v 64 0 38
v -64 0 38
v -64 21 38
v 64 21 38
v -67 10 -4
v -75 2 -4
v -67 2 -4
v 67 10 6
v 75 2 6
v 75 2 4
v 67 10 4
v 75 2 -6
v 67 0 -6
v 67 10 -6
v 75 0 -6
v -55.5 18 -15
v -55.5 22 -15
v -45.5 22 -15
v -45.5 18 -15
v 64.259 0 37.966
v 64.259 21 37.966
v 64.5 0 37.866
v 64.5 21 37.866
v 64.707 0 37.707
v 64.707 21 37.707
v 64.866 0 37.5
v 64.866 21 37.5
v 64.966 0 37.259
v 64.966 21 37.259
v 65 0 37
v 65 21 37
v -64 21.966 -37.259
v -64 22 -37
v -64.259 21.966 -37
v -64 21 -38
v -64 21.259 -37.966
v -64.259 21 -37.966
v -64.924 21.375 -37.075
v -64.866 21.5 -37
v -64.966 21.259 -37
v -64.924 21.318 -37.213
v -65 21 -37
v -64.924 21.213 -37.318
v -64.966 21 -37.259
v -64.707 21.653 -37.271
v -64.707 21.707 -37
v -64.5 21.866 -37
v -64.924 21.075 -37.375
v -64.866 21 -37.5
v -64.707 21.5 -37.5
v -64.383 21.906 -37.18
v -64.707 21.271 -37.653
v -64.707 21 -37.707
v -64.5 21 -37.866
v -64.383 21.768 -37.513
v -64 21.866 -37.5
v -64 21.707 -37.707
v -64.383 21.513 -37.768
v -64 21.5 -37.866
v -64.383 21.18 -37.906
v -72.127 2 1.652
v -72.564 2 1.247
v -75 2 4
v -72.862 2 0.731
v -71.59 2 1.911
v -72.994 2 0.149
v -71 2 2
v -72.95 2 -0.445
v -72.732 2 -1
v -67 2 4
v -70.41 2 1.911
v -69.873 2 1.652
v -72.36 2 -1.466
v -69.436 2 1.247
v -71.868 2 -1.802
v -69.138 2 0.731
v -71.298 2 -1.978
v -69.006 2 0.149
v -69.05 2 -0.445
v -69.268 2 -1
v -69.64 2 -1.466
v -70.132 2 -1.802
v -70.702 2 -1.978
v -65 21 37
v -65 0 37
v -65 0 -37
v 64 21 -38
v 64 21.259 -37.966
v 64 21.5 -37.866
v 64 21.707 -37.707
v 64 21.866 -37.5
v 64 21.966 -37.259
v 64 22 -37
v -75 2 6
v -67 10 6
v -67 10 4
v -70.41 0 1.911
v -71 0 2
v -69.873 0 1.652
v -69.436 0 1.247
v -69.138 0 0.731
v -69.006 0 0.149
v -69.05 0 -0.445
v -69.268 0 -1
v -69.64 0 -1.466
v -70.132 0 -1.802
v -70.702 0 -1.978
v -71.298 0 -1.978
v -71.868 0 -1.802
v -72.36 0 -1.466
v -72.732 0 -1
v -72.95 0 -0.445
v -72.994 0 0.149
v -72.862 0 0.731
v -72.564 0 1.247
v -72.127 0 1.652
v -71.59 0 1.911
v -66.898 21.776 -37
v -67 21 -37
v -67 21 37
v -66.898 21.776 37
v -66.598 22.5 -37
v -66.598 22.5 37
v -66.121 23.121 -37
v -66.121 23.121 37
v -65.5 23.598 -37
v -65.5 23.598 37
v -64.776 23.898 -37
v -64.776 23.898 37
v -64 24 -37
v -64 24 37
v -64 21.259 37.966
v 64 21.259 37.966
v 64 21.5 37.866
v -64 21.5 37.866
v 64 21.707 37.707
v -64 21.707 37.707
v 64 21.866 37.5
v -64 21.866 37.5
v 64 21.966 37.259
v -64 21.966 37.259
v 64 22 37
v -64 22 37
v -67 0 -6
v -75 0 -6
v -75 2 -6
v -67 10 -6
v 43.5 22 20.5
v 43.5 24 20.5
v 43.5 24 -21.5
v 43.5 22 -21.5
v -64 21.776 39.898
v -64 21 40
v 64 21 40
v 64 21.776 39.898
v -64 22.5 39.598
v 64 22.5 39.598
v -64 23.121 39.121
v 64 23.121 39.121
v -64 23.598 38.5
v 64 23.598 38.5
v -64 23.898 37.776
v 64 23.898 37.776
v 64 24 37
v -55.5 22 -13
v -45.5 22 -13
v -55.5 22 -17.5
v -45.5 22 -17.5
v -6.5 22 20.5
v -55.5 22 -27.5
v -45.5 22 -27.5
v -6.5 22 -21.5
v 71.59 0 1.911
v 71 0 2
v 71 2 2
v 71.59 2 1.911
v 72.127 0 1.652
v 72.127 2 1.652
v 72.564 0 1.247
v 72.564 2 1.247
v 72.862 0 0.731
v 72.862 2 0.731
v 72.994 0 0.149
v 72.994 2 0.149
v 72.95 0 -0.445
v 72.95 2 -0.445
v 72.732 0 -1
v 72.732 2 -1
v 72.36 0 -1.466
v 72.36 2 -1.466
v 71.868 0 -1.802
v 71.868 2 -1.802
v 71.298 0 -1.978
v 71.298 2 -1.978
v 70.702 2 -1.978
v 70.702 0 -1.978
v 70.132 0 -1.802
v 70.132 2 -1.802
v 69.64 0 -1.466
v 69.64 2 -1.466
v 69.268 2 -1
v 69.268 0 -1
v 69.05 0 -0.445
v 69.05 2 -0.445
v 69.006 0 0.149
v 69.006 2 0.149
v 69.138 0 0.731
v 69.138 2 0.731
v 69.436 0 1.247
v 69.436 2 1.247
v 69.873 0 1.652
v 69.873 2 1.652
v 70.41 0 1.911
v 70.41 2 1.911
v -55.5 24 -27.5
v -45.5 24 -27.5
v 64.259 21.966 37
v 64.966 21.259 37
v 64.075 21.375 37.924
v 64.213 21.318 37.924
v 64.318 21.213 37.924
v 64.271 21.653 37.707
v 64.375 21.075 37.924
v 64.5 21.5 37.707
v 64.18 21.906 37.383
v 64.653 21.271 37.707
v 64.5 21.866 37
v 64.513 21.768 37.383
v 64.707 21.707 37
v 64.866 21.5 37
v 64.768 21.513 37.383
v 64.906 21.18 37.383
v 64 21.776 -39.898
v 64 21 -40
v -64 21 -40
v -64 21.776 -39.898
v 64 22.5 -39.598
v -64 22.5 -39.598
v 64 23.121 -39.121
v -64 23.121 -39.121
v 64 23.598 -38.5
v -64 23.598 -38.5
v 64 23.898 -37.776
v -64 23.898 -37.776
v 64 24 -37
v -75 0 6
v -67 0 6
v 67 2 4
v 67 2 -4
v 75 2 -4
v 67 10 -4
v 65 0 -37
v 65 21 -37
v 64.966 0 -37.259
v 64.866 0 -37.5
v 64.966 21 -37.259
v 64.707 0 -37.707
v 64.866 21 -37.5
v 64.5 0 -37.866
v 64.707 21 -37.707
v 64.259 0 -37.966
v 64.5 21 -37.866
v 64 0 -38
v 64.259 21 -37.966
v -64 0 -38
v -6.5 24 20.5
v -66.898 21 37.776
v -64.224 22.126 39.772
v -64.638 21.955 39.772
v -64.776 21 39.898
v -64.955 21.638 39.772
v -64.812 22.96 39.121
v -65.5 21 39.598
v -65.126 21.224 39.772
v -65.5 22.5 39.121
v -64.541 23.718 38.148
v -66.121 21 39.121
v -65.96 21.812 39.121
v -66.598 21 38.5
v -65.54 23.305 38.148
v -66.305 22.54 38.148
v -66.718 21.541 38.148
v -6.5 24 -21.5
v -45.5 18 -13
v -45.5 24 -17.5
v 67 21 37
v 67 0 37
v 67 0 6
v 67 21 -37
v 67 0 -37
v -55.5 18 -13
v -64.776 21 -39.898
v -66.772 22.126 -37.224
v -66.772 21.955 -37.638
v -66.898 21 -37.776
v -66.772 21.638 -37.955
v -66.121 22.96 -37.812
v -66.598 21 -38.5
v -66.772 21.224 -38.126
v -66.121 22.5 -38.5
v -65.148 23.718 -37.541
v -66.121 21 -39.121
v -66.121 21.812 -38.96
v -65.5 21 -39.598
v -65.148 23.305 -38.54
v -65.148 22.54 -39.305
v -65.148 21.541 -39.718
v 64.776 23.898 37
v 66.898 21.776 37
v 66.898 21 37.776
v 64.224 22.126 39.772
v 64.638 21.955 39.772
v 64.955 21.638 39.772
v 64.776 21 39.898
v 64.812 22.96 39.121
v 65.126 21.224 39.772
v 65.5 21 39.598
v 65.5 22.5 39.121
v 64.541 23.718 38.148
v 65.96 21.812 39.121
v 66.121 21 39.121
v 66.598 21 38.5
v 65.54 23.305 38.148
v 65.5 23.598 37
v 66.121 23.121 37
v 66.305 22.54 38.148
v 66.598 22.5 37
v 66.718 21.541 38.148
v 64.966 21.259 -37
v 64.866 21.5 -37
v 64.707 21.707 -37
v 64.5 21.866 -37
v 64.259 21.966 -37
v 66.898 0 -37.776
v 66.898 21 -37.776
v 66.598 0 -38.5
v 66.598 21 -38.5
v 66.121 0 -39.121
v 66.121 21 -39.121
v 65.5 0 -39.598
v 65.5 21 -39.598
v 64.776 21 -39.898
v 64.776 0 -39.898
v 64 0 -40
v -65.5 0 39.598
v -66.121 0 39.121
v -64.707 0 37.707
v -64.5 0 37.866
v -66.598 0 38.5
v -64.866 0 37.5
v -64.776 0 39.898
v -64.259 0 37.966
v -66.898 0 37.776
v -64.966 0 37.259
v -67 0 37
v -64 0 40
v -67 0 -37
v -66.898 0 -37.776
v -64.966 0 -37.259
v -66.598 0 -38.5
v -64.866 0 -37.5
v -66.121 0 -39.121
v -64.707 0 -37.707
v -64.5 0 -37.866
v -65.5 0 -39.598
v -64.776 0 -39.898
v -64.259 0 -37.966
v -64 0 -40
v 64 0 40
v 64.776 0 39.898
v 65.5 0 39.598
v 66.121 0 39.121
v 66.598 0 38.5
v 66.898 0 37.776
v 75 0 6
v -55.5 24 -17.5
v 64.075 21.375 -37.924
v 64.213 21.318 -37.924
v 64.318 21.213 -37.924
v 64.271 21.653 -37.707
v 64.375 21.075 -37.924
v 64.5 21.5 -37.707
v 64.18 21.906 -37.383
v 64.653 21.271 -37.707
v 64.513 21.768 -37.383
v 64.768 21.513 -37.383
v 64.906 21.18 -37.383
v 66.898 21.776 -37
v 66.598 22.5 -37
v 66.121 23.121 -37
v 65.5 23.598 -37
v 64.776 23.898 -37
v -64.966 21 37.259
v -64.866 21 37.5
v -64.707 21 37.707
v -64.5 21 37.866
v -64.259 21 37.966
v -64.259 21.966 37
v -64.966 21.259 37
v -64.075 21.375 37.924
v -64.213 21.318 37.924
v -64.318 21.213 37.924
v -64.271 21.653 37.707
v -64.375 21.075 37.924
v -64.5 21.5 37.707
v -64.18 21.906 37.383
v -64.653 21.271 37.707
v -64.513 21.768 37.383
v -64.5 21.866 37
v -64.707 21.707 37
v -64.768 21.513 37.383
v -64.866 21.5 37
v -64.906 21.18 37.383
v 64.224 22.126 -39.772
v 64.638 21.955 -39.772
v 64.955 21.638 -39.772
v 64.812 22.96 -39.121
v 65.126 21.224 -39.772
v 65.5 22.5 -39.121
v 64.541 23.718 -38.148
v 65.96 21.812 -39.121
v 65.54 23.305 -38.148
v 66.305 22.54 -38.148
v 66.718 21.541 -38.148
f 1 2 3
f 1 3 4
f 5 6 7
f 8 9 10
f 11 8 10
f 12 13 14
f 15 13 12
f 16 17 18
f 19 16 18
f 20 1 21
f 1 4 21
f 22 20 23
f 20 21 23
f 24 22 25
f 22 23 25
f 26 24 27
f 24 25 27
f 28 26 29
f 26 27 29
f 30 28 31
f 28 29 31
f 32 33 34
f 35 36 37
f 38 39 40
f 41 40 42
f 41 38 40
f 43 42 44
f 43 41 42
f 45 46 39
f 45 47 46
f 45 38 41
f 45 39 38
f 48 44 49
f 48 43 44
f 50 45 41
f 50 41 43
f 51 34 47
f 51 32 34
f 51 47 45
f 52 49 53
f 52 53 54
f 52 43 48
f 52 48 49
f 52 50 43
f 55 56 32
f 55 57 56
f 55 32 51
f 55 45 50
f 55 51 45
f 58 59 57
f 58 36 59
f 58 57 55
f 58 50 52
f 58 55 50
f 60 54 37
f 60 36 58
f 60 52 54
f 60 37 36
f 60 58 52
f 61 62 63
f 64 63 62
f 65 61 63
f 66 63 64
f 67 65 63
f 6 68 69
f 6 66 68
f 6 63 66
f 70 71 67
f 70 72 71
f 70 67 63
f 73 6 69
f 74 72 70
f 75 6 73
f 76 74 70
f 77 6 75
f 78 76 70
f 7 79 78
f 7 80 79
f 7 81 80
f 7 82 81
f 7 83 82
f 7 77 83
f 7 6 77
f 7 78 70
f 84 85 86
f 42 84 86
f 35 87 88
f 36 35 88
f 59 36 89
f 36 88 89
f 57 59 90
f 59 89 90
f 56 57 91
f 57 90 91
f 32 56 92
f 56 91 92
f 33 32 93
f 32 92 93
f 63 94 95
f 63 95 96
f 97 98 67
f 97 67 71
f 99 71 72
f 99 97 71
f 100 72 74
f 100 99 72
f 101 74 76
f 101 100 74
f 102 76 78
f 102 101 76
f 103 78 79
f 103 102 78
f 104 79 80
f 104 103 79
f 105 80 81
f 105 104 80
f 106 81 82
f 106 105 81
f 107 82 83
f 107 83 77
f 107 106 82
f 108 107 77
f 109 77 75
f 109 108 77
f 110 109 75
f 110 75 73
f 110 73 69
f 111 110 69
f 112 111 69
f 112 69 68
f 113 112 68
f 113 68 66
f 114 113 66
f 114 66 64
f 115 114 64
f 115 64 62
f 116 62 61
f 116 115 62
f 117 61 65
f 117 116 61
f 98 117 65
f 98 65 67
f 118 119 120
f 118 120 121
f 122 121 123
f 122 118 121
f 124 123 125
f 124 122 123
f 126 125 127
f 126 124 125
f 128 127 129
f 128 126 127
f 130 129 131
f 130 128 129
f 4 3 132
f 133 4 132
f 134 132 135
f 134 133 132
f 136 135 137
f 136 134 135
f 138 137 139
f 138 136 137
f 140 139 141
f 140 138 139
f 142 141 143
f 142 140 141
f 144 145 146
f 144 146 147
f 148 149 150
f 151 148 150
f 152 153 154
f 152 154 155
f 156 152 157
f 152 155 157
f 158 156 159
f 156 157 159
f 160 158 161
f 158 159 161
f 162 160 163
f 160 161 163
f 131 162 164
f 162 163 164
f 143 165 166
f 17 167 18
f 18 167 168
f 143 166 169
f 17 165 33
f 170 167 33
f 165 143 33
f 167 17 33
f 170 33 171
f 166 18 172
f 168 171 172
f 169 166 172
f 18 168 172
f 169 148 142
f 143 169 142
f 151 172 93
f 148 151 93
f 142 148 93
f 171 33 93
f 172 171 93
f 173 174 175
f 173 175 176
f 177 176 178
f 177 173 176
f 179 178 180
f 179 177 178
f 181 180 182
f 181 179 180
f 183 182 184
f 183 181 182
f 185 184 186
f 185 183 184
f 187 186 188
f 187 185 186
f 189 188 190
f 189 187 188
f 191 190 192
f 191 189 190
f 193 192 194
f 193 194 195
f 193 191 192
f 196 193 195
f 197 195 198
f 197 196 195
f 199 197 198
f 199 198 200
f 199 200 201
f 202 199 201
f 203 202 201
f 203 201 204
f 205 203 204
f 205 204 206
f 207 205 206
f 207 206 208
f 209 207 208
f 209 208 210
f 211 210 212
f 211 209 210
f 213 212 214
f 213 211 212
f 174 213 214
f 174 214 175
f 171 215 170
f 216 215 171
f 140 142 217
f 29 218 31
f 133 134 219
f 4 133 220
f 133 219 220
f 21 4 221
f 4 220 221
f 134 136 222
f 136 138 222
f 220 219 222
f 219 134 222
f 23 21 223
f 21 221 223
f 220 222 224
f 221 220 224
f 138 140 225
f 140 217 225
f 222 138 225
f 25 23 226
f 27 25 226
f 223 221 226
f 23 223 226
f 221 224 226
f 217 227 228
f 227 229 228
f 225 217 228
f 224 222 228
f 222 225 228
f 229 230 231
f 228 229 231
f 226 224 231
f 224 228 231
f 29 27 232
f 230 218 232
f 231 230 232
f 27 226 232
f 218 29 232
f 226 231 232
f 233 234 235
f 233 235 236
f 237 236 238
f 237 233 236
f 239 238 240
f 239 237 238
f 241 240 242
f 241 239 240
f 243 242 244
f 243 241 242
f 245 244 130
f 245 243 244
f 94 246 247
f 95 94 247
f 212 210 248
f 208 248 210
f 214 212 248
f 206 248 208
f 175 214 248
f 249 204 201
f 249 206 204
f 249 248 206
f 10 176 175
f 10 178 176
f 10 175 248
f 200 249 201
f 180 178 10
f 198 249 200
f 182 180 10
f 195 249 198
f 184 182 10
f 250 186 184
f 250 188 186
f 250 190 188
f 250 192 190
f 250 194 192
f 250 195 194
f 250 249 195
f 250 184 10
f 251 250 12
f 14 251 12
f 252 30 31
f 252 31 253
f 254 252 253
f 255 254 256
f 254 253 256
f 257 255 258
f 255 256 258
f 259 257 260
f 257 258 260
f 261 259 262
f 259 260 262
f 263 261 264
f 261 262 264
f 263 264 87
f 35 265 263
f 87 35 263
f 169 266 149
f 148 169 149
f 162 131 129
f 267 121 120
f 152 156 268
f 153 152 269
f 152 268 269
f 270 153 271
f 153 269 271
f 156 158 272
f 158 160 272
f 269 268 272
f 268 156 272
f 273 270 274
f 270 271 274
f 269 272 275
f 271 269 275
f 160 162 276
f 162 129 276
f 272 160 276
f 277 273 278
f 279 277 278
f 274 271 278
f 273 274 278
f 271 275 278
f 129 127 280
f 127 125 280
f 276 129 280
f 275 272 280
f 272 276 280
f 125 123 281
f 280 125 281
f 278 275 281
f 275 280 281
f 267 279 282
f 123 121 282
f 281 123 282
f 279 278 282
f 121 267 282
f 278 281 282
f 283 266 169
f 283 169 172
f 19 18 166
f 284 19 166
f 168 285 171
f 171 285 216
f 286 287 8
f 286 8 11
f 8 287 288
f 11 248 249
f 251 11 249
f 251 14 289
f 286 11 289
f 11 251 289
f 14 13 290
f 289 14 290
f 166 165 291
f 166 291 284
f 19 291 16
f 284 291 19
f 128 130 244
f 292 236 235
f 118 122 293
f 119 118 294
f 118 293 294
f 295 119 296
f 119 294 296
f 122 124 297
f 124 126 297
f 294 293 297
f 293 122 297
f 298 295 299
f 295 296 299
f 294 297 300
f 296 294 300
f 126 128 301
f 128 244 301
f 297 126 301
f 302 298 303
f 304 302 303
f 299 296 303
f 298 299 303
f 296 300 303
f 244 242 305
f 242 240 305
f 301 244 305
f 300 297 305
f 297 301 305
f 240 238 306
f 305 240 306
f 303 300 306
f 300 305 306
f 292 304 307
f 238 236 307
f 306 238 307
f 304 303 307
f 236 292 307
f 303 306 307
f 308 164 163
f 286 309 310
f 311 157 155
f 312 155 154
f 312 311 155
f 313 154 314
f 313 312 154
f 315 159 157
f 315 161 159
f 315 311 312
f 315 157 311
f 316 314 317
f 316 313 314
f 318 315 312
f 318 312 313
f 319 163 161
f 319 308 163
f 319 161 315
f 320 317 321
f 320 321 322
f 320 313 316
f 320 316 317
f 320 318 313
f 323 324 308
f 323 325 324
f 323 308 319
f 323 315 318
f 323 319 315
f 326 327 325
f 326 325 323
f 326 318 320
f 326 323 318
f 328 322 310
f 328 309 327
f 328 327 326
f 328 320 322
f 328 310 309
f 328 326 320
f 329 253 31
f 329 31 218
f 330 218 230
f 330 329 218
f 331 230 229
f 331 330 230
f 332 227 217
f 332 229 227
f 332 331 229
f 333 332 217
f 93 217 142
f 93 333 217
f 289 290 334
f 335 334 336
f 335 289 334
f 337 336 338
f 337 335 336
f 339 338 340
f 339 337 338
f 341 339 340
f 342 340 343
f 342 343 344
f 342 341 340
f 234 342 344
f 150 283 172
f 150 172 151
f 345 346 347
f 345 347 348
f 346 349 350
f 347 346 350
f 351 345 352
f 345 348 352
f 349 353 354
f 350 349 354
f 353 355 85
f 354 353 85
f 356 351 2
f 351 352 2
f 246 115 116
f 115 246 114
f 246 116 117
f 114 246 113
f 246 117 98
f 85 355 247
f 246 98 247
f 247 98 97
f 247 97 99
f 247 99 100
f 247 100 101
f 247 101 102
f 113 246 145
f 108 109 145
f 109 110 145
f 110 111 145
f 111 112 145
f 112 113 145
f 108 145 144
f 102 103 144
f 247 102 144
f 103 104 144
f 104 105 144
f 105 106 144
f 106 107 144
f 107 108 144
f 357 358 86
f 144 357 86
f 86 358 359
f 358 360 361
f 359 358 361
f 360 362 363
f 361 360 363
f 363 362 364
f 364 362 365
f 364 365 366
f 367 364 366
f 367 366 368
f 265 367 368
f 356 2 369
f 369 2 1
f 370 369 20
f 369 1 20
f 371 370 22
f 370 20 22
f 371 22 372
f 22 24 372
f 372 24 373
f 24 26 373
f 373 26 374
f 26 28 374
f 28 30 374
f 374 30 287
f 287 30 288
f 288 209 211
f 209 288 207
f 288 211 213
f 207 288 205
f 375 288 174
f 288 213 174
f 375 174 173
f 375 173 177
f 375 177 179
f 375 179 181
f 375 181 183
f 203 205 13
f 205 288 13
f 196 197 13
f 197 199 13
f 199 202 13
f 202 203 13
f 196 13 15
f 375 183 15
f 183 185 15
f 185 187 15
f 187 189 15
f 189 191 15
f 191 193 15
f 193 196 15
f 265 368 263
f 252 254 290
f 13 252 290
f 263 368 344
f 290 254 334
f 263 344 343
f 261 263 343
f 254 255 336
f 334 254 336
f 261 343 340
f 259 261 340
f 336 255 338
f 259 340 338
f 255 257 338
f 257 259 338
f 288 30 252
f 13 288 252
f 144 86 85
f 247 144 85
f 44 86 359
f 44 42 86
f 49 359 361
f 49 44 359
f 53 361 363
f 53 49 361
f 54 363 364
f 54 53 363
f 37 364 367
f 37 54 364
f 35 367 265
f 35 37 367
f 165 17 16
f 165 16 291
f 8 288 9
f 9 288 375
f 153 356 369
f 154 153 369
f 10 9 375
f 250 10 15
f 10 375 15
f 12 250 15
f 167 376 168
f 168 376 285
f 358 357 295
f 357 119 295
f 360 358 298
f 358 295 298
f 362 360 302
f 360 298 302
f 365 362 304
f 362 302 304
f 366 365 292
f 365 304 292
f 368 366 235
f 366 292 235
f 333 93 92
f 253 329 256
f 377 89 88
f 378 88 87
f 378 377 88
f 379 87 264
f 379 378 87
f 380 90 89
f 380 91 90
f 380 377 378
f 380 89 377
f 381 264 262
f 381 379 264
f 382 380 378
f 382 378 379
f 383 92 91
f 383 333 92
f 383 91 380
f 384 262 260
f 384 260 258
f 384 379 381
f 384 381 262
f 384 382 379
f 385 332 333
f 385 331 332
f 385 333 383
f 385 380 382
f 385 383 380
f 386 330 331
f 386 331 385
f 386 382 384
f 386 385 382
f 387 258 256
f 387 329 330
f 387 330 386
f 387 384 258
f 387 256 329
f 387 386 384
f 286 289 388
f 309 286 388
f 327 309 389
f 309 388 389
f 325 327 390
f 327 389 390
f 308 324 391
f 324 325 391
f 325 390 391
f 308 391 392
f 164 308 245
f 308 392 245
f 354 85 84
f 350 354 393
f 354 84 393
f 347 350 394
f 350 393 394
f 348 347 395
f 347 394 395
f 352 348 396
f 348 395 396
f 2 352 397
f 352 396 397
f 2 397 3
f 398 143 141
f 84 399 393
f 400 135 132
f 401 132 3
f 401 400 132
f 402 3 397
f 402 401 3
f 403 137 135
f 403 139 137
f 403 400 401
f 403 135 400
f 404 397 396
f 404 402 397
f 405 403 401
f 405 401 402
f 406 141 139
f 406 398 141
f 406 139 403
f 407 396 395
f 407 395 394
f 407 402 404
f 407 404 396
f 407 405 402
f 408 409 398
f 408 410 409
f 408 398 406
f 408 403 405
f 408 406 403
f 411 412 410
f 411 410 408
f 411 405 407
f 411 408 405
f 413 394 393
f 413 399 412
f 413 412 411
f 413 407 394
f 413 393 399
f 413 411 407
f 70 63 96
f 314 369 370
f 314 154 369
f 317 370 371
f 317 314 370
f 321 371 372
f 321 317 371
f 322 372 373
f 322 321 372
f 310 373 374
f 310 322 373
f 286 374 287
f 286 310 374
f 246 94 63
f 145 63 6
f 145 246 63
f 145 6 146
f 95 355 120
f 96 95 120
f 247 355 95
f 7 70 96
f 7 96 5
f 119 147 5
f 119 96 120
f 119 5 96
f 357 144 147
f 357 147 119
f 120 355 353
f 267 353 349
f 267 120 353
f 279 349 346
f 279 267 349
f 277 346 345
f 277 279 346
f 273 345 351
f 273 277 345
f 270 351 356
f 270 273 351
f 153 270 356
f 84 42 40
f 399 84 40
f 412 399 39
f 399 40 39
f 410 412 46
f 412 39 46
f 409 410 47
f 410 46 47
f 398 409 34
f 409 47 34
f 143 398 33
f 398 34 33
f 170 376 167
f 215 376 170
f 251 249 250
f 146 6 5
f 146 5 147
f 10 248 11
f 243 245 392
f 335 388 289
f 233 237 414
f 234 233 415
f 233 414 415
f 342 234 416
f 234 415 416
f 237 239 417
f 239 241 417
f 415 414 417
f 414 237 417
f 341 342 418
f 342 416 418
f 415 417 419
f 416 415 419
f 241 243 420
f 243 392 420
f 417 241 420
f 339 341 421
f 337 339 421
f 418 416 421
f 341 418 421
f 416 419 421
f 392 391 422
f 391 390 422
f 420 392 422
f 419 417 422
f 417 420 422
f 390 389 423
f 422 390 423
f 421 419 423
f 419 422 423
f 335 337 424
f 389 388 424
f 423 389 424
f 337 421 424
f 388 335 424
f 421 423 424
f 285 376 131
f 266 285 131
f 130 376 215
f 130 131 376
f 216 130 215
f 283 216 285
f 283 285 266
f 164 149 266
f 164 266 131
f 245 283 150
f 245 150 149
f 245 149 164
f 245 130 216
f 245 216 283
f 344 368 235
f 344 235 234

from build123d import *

# Parameters (mm, degrees)
SKETCH_1_W          = 134
SKETCH_1_H          = 80
EXTRUDE_352_DEPTH   = 24
FILLET_1_R          = 3
SHELL_1_T           = -2
SKETCH_2_W          = 50
SKETCH_2_H          = 42
SKETCH_2_W_2        = 10
SKETCH_2_H_2        = 10
CUT_EXTRUDE_1_DEPTH = 2
SKETCH_3_W          = 8
SKETCH_3_H          = 12
SKETCH_3_R          = 2
EXTRUDE_1169_DEPTH  = 2
SKETCH_4_W          = 8
SKETCH_4_H          = 2
EXTRUDE_3_DEPTH     = 8
SKETCH_5_W          = 8
SKETCH_5_H          = 2
EXTRUDE_4_DEPTH     = 8
CHAMFER_1_SIZE      = 8
SKETCH_6_W          = 10
SKETCH_6_H          = 2
EXTRUDE_5_DEPTH     = 4


with BuildPart() as part:
    # Эскиз1 → Extrude 352 (new body)
    with BuildSketch(Plane(origin=(0, 0, 0), x_dir=(1, 0, 0), z_dir=(0, 1, 0))):
        Rectangle(SKETCH_1_W, SKETCH_1_H)
    extrude(amount=EXTRUDE_352_DEPTH)

    # Скругление1
    fillet_1_edges = [part.edges().sort_by_distance(p)[0] for p in [
        (67, 24, 0),
        (0, 24, -40),
        (-67, 24, 0),
        (0, 24, 40),
        (-67, 12, -40),
        (67, 12, -40),
        (67, 12, 40),
        (-67, 12, 40),
    ]]
    fillet(fillet_1_edges, radius=FILLET_1_R)

    # Оболочка1
    shell_1_openings = [part.faces().sort_by_distance(p)[0] for p in [
        (0, 0, 0),
    ]]
    offset(amount=SHELL_1_T, openings=shell_1_openings, kind=Kind.INTERSECTION)

    # Эскиз2 → Вырез-Вытянуть1 (cut)
    with BuildSketch(Plane(origin=(0, 24, 0), x_dir=(1, 0, 0), z_dir=(0, 1, 0))):
        with Locations((18.5, 0.5)):
            Rectangle(SKETCH_2_W, SKETCH_2_H)
        with Locations((-50.5, 22.5)):
            Rectangle(SKETCH_2_W_2, SKETCH_2_H_2)
    extrude(amount=-CUT_EXTRUDE_1_DEPTH, mode=Mode.SUBTRACT)

    # Эскиз3 → Extrude 1169 (add)
    # profile 1 of 2: a face of its own
    with BuildSketch(Plane(origin=(0, 0, 0), x_dir=(1, 0, 0), z_dir=(0, 1, 0))):
        with Locations((-71, 0)):
            Rectangle(SKETCH_3_W, SKETCH_3_H)
        with Locations(Location((-71, 0, 0), (0, 0, 270))):
            Circle(SKETCH_3_R, mode=Mode.SUBTRACT)
    # profile 2 of 2: a face of its own
    with BuildSketch(Plane(origin=(0, 0, 0), x_dir=(1, 0, 0), z_dir=(0, 1, 0))):
        with Locations((71, 0)):
            Rectangle(SKETCH_3_W, SKETCH_3_H)
        with Locations(Location((71, 0, 0), (0, 0, 270))):
            Circle(SKETCH_3_R, mode=Mode.SUBTRACT)
    extrude(amount=EXTRUDE_1169_DEPTH)

    # Эскиз4 → Бобышка-Вытянуть3 (add)
    with BuildSketch(Plane(origin=(0, 2, 0), x_dir=(1, 0, 0), z_dir=(0, 1, 0))):
        with Locations((-71, 5)):
            Rectangle(SKETCH_4_W, SKETCH_4_H)
        with Locations((-71, -5)):
            Rectangle(SKETCH_4_W, SKETCH_4_H)
    extrude(amount=EXTRUDE_3_DEPTH)

    # Эскиз5 → Бобышка-Вытянуть4 (add)
    with BuildSketch(Plane(origin=(0, 2, 0), x_dir=(1, 0, 0), z_dir=(0, 1, 0))):
        with Locations((71, 5)):
            Rectangle(SKETCH_5_W, SKETCH_5_H)
        with Locations((71, -5)):
            Rectangle(SKETCH_5_W, SKETCH_5_H)
    extrude(amount=EXTRUDE_4_DEPTH)

    # Фаска1
    chamfer_1_edges = [part.edges().sort_by_distance(p)[0] for p in [
        (75, 10, 5),
        (75, 10, -5),
        (-75, 10, 5),
        (-75, 10, -5),
    ]]
    chamfer(chamfer_1_edges, length=CHAMFER_1_SIZE - 0.0001)  # a hair under: the kernel refuses the full size

    # Эскиз6 → Бобышка-Вытянуть5 (add)
    with BuildSketch(Plane.XZ.offset(-22)):
        with Locations((-50.5, -14)):
            Rectangle(SKETCH_6_W, SKETCH_6_H)
    extrude(amount=EXTRUDE_5_DEPTH)


solid = part.part
